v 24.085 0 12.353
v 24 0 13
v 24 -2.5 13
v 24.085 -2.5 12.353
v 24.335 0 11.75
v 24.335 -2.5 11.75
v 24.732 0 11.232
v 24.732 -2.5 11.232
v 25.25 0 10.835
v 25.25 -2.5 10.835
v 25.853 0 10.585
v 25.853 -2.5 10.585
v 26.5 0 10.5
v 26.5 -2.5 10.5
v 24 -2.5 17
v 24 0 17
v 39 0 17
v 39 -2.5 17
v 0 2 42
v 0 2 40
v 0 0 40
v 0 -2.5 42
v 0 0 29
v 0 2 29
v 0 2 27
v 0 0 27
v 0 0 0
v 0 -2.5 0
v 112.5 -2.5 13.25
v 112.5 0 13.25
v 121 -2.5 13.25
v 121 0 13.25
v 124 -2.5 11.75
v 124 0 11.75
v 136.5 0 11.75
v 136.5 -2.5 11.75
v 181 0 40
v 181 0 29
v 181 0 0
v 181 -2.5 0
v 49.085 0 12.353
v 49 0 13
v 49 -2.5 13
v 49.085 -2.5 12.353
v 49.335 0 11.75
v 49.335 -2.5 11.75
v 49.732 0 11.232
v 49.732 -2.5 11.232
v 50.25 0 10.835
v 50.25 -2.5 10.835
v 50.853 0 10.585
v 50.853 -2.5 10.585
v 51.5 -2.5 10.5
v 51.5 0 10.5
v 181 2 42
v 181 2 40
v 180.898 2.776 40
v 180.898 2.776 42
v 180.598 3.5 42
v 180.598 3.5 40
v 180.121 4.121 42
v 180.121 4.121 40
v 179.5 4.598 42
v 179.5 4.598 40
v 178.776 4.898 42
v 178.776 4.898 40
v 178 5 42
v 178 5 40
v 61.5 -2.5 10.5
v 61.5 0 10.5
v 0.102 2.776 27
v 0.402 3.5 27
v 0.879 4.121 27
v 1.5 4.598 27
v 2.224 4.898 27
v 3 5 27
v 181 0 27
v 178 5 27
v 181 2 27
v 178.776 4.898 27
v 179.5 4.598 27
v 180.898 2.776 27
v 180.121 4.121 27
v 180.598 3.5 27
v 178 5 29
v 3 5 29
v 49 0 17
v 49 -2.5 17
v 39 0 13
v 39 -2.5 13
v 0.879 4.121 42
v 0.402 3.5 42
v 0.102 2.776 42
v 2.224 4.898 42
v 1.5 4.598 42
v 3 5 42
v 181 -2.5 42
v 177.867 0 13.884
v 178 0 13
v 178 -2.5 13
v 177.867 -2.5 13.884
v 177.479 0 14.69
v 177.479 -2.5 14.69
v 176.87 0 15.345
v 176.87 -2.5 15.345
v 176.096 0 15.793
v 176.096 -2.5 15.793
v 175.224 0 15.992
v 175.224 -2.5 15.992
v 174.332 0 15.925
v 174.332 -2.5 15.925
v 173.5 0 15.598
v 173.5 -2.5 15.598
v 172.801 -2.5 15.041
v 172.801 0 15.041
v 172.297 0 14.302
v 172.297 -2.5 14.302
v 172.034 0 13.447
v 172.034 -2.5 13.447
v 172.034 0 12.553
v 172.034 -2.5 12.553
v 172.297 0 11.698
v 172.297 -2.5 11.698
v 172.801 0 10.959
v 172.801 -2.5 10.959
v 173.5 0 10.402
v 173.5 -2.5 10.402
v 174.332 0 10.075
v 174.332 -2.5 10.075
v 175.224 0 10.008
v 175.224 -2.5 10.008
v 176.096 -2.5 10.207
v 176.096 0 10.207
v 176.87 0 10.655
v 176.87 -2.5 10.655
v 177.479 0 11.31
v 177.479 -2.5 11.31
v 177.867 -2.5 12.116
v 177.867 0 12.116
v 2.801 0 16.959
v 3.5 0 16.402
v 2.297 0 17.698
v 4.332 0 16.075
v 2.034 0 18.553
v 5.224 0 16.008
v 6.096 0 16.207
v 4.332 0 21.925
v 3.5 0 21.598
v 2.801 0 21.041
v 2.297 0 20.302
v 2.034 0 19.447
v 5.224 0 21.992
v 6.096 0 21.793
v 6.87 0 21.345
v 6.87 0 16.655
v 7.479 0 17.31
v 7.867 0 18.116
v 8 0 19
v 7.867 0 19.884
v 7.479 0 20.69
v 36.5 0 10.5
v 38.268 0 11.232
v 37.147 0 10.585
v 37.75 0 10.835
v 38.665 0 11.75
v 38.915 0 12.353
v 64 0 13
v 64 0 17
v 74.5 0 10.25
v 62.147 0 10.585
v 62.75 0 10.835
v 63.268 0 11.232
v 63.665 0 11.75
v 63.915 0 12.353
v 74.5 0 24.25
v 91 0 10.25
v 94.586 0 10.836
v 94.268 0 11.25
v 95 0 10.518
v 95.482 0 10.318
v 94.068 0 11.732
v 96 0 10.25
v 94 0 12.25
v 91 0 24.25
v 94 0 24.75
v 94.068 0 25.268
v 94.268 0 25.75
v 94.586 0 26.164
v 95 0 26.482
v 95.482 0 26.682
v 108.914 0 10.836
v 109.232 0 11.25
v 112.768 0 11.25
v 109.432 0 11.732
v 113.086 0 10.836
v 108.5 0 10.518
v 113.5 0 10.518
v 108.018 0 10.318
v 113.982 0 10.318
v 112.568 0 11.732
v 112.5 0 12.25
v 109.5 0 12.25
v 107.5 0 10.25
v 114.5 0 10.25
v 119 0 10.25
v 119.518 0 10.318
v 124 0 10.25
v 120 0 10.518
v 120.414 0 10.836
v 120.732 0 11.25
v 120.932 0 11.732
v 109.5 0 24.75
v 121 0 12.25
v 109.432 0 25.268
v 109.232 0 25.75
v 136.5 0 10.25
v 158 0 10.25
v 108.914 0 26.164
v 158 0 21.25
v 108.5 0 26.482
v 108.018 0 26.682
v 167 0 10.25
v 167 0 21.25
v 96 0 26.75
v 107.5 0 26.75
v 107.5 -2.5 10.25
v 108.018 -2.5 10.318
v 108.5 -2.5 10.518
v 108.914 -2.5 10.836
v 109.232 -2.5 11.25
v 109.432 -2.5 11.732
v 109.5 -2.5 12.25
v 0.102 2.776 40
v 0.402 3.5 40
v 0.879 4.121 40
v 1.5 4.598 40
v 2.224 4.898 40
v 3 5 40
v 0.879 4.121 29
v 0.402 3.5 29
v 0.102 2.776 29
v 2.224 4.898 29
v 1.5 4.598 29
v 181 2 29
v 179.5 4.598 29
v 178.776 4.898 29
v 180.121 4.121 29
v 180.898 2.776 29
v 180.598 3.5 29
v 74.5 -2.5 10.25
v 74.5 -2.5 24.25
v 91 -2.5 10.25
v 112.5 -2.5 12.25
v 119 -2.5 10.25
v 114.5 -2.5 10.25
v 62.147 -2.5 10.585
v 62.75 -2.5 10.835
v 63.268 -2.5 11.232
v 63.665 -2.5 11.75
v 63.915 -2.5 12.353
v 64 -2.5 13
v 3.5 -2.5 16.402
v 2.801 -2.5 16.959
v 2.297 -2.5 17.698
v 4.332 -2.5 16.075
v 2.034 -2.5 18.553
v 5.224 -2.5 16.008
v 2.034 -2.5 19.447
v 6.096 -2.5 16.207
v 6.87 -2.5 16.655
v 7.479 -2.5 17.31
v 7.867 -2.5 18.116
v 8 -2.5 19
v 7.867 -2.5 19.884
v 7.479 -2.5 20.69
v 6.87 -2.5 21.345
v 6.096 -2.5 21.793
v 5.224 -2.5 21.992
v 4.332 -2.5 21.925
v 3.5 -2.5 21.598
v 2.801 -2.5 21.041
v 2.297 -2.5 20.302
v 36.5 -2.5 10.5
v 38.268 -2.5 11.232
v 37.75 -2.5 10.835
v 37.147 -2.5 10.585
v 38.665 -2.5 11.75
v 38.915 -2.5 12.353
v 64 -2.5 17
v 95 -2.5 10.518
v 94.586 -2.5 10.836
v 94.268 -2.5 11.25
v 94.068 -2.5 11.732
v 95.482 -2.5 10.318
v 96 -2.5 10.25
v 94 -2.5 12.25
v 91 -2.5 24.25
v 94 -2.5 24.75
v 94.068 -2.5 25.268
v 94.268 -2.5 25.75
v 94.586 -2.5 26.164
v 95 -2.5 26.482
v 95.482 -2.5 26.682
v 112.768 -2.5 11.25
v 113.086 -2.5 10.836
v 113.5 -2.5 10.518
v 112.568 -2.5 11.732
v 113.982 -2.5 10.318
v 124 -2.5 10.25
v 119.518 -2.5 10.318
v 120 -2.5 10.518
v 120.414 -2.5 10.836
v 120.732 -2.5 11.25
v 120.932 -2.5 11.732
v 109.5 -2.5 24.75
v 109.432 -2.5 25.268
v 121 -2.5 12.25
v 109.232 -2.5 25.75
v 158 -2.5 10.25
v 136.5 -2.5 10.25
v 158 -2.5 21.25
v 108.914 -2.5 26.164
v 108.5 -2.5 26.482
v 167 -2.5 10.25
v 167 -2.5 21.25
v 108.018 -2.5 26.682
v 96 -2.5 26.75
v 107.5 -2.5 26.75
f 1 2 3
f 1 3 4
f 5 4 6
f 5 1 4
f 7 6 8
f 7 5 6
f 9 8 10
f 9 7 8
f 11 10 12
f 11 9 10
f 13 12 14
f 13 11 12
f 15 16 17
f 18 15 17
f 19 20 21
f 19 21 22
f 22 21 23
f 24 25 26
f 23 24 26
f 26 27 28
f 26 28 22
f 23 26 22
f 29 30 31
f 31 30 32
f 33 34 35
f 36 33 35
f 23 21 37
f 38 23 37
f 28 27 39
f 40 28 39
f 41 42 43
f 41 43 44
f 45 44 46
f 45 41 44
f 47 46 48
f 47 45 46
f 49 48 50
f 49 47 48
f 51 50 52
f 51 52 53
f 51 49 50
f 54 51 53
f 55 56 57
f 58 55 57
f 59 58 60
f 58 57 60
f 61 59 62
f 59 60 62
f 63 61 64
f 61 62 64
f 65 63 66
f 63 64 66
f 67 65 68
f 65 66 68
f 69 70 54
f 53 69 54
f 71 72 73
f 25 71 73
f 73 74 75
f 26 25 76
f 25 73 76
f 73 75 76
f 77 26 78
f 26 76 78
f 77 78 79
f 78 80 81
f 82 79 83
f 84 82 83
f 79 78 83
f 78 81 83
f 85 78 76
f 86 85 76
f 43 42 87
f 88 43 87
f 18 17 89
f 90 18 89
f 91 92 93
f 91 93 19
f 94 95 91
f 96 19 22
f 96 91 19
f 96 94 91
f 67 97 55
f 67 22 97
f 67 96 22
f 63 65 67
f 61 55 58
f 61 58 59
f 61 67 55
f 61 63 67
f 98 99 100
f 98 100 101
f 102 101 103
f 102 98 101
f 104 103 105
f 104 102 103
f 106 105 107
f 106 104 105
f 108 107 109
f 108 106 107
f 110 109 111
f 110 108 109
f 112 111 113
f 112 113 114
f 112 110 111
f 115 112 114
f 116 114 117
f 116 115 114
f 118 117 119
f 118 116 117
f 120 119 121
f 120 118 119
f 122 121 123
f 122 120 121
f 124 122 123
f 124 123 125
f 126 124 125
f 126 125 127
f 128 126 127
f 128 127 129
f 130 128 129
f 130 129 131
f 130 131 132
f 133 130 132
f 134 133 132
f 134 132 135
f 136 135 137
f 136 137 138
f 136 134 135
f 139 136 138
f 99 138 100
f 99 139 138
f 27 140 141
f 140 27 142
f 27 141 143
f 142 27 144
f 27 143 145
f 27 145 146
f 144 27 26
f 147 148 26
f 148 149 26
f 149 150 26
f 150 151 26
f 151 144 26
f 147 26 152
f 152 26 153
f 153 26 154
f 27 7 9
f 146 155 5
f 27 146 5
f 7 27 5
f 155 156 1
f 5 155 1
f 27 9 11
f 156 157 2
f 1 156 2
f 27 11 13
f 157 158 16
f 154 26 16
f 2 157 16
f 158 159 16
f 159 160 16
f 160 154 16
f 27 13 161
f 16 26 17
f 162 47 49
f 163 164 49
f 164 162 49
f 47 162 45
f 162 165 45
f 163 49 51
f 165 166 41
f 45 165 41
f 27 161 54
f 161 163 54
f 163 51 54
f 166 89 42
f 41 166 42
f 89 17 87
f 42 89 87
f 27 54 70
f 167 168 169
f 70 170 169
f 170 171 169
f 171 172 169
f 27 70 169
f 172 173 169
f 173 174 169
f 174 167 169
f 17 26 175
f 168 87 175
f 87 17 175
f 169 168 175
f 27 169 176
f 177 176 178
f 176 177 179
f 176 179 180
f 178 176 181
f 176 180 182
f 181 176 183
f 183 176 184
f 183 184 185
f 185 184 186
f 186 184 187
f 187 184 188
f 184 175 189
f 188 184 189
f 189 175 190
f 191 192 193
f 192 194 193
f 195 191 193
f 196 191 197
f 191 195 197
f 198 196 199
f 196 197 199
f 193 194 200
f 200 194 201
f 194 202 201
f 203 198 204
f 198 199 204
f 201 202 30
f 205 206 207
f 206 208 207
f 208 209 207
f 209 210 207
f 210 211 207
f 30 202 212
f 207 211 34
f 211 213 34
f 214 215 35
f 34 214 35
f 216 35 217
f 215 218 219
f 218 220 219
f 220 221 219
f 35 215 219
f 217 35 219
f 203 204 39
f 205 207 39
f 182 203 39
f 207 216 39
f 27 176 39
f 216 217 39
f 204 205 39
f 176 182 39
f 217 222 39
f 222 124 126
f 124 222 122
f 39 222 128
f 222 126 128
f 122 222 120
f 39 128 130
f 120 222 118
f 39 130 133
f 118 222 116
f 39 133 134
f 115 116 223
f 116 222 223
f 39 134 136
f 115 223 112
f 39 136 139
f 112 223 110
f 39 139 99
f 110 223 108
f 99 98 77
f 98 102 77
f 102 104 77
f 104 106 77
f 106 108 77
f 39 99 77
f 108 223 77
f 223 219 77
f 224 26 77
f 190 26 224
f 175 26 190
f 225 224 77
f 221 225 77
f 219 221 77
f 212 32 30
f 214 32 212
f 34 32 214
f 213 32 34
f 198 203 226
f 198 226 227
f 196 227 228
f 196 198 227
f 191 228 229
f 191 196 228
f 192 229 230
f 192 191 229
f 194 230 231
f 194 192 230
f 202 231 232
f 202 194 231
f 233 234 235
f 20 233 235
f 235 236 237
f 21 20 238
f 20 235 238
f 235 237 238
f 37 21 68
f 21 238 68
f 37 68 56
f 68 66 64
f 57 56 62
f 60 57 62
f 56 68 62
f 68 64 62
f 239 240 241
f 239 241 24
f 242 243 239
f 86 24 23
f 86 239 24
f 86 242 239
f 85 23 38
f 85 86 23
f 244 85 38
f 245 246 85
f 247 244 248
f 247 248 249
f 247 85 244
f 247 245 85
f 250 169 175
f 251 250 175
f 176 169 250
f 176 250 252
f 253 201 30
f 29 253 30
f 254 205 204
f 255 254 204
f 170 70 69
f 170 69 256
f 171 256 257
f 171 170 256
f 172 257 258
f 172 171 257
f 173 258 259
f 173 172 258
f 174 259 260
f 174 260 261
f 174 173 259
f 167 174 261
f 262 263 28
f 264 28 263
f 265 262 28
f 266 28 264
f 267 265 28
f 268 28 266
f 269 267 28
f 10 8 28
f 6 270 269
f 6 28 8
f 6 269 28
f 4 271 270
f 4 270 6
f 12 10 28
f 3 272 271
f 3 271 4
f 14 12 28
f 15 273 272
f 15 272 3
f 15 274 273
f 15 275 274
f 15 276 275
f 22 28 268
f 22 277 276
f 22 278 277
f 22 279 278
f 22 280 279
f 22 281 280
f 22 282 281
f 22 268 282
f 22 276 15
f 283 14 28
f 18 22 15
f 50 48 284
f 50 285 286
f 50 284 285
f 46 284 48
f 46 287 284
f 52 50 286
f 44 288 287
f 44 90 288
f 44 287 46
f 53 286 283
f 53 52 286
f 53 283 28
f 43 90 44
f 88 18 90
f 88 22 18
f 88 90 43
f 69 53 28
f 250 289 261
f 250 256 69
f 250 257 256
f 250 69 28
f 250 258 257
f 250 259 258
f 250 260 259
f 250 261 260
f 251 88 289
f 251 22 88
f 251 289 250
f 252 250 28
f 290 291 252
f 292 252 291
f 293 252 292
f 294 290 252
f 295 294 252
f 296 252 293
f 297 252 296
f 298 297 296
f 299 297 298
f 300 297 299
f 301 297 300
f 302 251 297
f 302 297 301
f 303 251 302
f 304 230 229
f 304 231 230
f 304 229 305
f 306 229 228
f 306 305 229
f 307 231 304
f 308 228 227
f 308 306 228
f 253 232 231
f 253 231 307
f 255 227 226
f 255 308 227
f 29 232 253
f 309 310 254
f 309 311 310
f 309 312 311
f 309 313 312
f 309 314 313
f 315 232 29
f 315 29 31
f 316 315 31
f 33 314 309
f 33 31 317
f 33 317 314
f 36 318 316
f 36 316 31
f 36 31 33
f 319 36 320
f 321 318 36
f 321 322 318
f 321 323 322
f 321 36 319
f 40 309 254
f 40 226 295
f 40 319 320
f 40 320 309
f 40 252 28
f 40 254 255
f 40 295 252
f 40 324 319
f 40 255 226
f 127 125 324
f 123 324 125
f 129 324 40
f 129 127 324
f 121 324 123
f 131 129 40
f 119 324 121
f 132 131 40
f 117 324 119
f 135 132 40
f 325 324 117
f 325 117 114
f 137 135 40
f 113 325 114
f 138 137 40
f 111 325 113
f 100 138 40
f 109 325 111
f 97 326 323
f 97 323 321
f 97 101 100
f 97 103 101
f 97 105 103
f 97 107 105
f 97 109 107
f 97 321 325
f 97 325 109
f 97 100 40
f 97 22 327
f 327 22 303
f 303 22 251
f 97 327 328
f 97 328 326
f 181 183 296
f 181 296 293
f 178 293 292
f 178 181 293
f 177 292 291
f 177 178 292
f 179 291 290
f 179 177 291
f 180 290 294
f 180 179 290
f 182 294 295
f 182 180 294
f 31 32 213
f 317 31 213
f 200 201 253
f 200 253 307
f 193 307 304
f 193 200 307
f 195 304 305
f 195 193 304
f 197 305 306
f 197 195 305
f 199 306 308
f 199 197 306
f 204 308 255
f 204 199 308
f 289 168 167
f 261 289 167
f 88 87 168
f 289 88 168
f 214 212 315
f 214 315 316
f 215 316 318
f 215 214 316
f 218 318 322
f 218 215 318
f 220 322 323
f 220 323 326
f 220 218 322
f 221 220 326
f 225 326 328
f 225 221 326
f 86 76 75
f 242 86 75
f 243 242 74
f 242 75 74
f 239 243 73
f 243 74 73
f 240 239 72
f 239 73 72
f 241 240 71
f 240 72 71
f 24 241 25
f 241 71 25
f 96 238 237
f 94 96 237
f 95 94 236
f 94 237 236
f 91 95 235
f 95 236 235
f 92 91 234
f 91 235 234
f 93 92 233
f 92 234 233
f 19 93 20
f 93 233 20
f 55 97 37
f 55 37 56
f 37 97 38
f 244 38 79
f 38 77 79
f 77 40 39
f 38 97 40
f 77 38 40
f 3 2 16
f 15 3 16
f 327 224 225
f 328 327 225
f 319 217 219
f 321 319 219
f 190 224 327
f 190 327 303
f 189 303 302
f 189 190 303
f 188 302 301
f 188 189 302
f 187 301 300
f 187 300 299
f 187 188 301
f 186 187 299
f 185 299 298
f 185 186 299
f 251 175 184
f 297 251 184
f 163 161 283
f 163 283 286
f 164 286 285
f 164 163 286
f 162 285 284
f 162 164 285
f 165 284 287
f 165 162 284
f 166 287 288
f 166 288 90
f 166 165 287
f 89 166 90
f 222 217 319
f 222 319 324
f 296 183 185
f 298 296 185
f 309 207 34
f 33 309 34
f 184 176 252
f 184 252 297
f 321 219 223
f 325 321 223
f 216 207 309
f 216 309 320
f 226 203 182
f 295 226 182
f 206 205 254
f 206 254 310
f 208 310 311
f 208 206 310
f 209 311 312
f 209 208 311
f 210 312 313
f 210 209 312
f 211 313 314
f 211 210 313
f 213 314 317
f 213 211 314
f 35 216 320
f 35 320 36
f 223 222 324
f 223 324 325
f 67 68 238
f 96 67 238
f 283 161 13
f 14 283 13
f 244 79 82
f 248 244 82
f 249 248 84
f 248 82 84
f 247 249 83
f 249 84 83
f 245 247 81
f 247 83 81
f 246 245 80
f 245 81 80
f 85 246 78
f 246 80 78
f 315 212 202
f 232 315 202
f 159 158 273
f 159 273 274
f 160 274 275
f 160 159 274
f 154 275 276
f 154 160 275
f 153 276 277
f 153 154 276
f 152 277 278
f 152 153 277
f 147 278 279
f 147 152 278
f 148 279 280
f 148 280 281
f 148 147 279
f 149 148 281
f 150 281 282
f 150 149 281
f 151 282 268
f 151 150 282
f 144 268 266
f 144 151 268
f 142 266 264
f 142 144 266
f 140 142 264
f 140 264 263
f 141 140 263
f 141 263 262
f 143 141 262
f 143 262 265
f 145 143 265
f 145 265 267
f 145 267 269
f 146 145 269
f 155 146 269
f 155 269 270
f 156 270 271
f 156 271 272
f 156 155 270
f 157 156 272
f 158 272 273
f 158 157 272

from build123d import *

# Parameters (mm, degrees)
SKETCH_W     = 181
SKETCH_H     = 42
SKETCH_R     = 3
SKETCH_W_2   = 9
SKETCH_H_2   = 11
SKETCH_W_3   = 12.5
SKETCH_H_3   = 1.5
SKETCH_W_4   = 16.5
SKETCH_H_4   = 14
PAD_DEPTH    = 2.5
PAD001_DEPTH = 2
PAD002_DEPTH = 2


with BuildPart() as part:
    # Sketch → Pad (new body)
    with BuildSketch(Plane.XZ):
        with Locations((90.5, 21)):
            Rectangle(SKETCH_W, SKETCH_H)
        with Locations((175, 13)):
            Circle(SKETCH_R, mode=Mode.SUBTRACT)
        with Locations((5, 19)):
            Circle(SKETCH_R, mode=Mode.SUBTRACT)
        with Locations((162.5, 15.75)):
            Rectangle(SKETCH_W_2, SKETCH_H_2, mode=Mode.SUBTRACT)
        with BuildLine():
            Line((96, 26.75), (107.5, 26.75))
            ThreePointArc((109.5, 24.75), (108.914214, 26.164214), (107.5, 26.75))
            Line((109.5, 24.75), (109.5, 12.25))
            ThreePointArc((107.5, 10.25), (108.914214, 10.835786), (109.5, 12.25))
            Line((107.5, 10.25), (96, 10.25))
            ThreePointArc((94, 12.25), (94.585786, 10.835786), (96, 10.25))
            Line((94, 12.25), (94, 24.75))
            ThreePointArc((96, 26.75), (94.585786, 26.164214), (94, 24.75))
        make_face(mode=Mode.SUBTRACT)
        with Locations((130.25, 11)):
            Rectangle(SKETCH_W_3, SKETCH_H_3, mode=Mode.SUBTRACT)
        with BuildLine():
            Line((112.5, 13.25), (121, 13.25))
            Line((121, 13.25), (121, 12.25))
            ThreePointArc((119, 10.25), (120.414214, 10.835786), (121, 12.25))
            Line((119, 10.25), (114.5, 10.25))
            ThreePointArc((112.5, 12.25), (113.085786, 10.835786), (114.5, 10.25))
            Line((112.5, 12.25), (112.5, 13.25))
        make_face(mode=Mode.SUBTRACT)
        with Locations((82.75, 17.25)):
            Rectangle(SKETCH_W_4, SKETCH_H_4, mode=Mode.SUBTRACT)
        with BuildLine():
            Line((49, 17), (64, 17))
            Line((64, 17), (64, 13))
            ThreePointArc((61.5, 10.5), (63.267767, 11.232233), (64, 13))
            Line((61.5, 10.5), (51.5, 10.5))
            ThreePointArc((49, 13), (49.732233, 11.232233), (51.5, 10.5))
            Line((49, 13), (49, 17))
        make_face(mode=Mode.SUBTRACT)
        with BuildLine():
            Line((24, 17), (39, 17))
            Line((39, 17), (39, 13))
            ThreePointArc((36.5, 10.5), (38.267767, 11.232233), (39, 13))
            Line((36.5, 10.5), (26.5, 10.5))
            ThreePointArc((24, 13), (24.732233, 11.232233), (26.5, 10.5))
            Line((24, 13), (24, 17))
        make_face(mode=Mode.SUBTRACT)
    extrude(amount=PAD_DEPTH)

    # Sketch001 (on Part) → Pad001 (join)
    with BuildSketch(Plane.XY.offset(27)):
        with BuildLine():
            Line((0, 0), (181, 0))
            Line((181, 0), (181, 2))
            ThreePointArc((181, 2), (180.12132, 4.12132), (178, 5))
            Line((178, 5), (3, 5))
            ThreePointArc((3, 5), (0.87868, 4.12132), (0, 2))
            Line((0, 2), (0, 0))
        make_face()
    extrude(amount=PAD001_DEPTH)

    # Sketch002 → Pad002 (join)
    with BuildSketch(Plane.XY.offset(40)):
        with BuildLine():
            Line((0, 0), (181, 0))
            Line((181, 0), (181, 2))
            ThreePointArc((181, 2), (180.12132, 4.12132), (178, 5))
            Line((178, 5), (3, 5))
            ThreePointArc((3, 5), (0.87868, 4.12132), (0, 2))
            Line((0, 2), (0, 0))
        make_face()
    extrude(amount=PAD002_DEPTH)


solid = part.part
